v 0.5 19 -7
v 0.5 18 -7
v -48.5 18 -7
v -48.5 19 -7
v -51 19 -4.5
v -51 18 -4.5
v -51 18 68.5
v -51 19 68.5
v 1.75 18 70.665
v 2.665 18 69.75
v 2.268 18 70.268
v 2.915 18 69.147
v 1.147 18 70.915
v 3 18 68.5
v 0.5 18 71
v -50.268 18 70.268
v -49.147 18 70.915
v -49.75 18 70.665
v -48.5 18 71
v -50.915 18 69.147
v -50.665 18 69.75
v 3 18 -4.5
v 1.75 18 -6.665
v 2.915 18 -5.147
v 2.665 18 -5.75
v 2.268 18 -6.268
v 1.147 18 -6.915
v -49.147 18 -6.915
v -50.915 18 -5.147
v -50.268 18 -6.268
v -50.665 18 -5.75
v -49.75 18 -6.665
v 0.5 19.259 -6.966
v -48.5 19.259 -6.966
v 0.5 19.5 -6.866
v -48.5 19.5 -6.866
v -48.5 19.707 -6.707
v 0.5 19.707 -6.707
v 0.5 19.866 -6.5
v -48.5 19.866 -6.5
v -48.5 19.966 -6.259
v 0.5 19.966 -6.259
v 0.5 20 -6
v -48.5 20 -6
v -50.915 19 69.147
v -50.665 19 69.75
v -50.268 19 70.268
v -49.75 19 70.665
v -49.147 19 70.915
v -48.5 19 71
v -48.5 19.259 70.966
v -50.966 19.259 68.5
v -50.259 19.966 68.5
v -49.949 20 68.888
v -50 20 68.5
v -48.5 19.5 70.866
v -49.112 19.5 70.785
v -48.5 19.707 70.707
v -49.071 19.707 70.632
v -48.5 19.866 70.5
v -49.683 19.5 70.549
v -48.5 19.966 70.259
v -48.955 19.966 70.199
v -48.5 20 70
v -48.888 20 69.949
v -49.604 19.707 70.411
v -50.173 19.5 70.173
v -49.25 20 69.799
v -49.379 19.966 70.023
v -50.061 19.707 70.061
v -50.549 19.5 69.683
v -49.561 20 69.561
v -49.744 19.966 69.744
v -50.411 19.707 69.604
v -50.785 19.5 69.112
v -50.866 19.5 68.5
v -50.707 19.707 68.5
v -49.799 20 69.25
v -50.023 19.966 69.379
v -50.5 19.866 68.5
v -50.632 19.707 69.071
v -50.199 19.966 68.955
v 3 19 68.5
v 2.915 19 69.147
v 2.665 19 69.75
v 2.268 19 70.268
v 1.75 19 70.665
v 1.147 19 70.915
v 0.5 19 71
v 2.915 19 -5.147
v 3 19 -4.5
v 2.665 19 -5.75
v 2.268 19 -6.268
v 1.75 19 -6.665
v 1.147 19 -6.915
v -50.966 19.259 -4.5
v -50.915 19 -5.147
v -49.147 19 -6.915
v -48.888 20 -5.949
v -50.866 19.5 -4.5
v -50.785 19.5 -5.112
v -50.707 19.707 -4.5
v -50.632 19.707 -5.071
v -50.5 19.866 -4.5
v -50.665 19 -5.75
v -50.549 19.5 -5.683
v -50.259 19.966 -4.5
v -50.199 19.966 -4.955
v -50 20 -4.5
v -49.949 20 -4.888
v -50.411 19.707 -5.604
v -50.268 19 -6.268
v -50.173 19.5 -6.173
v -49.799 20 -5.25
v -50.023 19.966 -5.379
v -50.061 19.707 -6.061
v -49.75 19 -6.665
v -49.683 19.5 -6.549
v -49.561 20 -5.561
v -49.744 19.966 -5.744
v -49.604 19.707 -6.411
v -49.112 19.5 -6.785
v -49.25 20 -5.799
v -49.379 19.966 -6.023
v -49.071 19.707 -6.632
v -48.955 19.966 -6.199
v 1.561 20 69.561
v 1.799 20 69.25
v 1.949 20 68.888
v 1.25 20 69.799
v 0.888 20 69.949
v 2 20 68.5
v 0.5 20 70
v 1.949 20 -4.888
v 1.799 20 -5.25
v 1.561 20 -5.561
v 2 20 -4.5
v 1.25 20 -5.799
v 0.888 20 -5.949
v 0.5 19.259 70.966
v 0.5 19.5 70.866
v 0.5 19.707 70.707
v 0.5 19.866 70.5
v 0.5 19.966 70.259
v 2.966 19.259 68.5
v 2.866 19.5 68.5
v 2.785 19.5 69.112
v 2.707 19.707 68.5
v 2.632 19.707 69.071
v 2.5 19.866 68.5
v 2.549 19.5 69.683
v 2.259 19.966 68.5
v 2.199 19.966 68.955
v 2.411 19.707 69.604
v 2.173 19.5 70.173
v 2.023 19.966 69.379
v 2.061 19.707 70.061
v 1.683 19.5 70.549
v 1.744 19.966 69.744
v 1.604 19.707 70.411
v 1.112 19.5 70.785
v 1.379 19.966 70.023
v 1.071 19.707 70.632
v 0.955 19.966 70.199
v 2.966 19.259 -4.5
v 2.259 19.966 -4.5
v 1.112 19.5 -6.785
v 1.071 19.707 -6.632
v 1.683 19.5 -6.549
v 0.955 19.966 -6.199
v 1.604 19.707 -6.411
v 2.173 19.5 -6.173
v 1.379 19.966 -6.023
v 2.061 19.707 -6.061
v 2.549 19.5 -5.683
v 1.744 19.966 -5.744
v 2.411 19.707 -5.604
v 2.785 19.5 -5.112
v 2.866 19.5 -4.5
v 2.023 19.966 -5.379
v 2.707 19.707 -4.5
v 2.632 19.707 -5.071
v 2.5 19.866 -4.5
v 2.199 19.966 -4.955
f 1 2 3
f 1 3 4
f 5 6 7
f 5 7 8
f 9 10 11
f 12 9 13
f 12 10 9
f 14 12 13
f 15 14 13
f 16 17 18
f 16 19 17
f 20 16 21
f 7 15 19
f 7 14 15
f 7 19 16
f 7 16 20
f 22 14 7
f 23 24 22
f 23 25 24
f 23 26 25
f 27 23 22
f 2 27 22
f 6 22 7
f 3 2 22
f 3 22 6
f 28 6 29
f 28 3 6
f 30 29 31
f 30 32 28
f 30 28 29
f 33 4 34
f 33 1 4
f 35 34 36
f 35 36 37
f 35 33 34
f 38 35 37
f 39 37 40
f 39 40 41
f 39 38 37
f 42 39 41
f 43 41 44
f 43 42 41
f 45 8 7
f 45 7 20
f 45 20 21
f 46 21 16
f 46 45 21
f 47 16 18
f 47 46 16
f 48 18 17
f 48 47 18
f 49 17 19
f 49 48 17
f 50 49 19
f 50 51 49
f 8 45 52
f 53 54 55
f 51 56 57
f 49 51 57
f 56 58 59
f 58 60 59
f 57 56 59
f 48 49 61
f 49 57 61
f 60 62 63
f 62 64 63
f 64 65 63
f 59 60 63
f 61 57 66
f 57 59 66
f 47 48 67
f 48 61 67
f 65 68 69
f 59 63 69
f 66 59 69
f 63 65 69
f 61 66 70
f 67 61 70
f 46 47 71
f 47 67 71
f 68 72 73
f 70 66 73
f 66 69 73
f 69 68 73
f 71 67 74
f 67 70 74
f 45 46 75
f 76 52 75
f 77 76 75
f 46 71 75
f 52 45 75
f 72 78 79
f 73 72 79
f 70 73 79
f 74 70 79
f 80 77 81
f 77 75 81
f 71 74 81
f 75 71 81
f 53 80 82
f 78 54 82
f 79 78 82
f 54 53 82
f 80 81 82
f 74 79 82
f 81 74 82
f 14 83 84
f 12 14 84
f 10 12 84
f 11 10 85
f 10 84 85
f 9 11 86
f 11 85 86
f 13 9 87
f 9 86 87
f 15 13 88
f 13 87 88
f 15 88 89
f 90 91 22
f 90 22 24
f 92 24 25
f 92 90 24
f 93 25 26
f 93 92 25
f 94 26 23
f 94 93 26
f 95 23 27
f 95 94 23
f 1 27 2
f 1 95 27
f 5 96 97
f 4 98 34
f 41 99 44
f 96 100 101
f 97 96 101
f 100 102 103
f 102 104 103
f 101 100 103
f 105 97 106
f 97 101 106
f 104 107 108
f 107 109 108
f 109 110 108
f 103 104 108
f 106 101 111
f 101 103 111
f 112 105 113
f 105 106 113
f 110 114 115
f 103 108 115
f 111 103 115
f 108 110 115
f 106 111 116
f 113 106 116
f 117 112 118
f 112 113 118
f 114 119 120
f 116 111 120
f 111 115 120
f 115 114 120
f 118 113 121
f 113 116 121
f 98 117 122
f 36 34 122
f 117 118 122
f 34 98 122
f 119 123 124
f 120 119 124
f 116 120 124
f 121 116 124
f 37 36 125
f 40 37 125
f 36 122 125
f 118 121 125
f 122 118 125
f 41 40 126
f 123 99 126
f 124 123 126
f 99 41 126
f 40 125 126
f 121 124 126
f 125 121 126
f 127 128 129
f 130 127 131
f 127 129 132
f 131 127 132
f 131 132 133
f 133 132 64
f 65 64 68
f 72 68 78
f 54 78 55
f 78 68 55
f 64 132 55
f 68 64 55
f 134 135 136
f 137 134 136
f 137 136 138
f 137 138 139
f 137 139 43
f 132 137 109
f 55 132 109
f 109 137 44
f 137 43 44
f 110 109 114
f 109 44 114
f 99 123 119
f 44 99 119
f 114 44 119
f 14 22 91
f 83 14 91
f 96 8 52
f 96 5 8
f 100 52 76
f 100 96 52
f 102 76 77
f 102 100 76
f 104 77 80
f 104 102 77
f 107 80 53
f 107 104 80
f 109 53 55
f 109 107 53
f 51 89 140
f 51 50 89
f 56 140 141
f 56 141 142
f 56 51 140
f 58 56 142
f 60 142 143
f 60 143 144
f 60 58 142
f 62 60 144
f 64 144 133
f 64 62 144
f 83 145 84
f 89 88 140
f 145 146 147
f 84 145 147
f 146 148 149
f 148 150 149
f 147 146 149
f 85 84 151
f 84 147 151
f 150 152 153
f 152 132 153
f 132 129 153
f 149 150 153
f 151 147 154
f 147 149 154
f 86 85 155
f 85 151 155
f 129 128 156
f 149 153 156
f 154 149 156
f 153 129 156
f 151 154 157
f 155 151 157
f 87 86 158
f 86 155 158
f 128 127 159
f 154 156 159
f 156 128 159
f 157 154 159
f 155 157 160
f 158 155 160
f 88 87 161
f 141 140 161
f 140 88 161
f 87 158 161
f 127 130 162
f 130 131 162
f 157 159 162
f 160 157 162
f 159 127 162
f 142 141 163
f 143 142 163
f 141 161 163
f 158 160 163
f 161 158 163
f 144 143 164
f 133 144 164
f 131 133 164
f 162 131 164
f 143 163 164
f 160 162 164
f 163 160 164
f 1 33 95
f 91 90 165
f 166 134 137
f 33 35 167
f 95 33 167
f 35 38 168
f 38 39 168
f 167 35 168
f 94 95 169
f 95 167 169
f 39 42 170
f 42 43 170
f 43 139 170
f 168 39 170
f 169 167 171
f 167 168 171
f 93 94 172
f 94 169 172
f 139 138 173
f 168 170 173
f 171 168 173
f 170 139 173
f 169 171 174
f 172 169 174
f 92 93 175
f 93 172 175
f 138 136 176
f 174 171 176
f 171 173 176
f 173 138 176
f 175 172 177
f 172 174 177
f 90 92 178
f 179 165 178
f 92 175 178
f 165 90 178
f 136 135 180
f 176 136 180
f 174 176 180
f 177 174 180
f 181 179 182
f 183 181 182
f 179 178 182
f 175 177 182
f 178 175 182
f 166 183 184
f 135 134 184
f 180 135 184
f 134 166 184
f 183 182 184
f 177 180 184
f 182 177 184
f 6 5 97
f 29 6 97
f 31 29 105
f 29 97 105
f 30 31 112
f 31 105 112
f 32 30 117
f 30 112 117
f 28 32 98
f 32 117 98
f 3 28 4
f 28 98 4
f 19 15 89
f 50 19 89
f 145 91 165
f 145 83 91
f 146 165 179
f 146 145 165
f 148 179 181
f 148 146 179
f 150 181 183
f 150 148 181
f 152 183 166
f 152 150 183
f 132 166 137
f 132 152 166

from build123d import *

# Parameters (mm, degrees)
BOX003_W     = 2
BOX003_H     = 54
BOX003_DEPTH = 78
FILLET003_R  = 2.5
FILLET004_R  = 1


with BuildPart() as part:
    # Box003 → Box003 (new body)
    with BuildSketch(Plane(origin=(3, 18, -7), x_dir=(0, 1, 0), z_dir=(0, 0, 1))):
        with Locations((1, 27)):
            Rectangle(BOX003_W, BOX003_H)
    extrude(amount=BOX003_DEPTH)

    # Fillet003
    fillet003_edges = [part.edges().sort_by_distance(p)[0] for p in [
        (3, 19, -7),
        (3, 19, 71),
        (-51, 19, -7),
        (-51, 19, 71),
    ]]
    fillet(fillet003_edges, radius=FILLET003_R)

    # Fillet004
    fillet004_edges = [part.edges().sort_by_distance(p)[0] for p in [
        (3, 20, 32),
        (-24, 20, -7),
        (-24, 20, 71),
        (-51, 20, 32),
    ]]
    fillet(fillet004_edges, radius=FILLET004_R)


solid = part.part
